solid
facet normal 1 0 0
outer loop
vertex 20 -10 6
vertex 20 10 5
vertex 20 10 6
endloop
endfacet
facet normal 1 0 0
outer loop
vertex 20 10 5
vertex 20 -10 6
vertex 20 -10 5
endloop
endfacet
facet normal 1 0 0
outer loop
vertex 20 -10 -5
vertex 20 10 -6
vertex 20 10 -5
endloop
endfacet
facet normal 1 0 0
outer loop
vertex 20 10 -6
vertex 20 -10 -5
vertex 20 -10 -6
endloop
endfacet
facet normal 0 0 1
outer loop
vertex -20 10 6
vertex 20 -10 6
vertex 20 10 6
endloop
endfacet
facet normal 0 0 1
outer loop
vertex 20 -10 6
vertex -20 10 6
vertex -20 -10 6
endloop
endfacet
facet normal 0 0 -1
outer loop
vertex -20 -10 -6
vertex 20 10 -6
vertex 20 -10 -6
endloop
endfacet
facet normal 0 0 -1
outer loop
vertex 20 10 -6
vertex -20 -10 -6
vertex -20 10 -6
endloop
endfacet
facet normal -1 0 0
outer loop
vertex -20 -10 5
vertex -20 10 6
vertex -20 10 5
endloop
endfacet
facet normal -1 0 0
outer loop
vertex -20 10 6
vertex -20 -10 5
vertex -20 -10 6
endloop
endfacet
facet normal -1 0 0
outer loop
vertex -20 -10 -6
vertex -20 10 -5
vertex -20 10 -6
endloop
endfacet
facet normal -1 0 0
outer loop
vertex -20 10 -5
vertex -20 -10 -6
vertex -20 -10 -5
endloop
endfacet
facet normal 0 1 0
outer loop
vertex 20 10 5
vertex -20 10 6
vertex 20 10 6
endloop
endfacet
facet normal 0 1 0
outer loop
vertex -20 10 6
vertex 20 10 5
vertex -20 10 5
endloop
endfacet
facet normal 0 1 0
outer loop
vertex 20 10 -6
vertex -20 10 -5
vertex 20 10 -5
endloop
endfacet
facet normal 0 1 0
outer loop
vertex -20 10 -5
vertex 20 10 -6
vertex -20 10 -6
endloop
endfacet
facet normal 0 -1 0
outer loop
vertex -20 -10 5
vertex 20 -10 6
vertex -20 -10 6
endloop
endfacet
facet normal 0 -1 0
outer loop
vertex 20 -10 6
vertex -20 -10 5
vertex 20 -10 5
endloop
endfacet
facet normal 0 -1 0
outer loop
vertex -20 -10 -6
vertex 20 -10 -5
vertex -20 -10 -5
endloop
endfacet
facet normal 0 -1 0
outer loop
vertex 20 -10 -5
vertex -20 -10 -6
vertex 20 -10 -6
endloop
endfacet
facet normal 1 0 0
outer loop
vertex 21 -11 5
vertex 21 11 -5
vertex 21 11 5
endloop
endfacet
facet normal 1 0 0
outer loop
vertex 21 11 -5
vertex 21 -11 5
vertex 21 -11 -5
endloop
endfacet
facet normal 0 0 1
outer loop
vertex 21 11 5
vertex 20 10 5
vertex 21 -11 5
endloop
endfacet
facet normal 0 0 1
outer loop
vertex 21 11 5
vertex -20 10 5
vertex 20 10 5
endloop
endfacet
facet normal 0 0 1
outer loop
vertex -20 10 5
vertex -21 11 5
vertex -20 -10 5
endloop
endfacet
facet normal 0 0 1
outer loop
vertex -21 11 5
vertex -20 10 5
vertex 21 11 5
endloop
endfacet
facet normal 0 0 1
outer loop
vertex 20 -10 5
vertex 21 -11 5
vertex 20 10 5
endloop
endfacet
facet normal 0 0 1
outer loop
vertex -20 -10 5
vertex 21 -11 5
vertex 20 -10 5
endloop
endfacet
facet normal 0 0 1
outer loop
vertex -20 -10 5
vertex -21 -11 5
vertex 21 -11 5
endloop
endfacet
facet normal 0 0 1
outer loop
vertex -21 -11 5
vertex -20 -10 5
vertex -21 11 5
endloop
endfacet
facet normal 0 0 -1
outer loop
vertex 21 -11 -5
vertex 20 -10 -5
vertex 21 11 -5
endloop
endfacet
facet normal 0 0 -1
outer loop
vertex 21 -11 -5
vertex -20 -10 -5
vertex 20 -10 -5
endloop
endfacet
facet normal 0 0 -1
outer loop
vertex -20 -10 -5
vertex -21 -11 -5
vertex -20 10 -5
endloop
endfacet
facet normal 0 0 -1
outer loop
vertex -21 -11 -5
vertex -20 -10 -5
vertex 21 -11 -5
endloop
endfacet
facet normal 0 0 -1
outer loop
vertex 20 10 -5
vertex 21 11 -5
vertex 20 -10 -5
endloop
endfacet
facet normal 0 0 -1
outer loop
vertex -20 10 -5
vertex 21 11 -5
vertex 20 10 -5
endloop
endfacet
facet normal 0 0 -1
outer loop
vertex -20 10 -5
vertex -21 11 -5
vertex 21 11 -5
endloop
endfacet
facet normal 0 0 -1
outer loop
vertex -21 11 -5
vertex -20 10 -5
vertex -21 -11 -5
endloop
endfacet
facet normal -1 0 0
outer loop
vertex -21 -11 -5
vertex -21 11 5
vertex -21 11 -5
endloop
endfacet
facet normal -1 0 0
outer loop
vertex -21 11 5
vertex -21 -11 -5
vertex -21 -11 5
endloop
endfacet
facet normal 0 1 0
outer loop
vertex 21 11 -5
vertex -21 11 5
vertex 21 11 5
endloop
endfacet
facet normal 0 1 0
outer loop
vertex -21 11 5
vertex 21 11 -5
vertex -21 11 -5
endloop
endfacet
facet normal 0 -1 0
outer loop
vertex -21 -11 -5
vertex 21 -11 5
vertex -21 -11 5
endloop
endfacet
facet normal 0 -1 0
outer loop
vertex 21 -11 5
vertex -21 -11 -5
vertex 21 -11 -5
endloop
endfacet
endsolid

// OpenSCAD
// Unit of length: Unit.MM
union()
{
   color(c = [1.0, 0.0, 0.0, 1.0])
   {
      cube(size = [40.0, 20.0, 12.0], center = true);
   }
   cube(size = [42.0, 22.0, 10.0], center = true);
}
